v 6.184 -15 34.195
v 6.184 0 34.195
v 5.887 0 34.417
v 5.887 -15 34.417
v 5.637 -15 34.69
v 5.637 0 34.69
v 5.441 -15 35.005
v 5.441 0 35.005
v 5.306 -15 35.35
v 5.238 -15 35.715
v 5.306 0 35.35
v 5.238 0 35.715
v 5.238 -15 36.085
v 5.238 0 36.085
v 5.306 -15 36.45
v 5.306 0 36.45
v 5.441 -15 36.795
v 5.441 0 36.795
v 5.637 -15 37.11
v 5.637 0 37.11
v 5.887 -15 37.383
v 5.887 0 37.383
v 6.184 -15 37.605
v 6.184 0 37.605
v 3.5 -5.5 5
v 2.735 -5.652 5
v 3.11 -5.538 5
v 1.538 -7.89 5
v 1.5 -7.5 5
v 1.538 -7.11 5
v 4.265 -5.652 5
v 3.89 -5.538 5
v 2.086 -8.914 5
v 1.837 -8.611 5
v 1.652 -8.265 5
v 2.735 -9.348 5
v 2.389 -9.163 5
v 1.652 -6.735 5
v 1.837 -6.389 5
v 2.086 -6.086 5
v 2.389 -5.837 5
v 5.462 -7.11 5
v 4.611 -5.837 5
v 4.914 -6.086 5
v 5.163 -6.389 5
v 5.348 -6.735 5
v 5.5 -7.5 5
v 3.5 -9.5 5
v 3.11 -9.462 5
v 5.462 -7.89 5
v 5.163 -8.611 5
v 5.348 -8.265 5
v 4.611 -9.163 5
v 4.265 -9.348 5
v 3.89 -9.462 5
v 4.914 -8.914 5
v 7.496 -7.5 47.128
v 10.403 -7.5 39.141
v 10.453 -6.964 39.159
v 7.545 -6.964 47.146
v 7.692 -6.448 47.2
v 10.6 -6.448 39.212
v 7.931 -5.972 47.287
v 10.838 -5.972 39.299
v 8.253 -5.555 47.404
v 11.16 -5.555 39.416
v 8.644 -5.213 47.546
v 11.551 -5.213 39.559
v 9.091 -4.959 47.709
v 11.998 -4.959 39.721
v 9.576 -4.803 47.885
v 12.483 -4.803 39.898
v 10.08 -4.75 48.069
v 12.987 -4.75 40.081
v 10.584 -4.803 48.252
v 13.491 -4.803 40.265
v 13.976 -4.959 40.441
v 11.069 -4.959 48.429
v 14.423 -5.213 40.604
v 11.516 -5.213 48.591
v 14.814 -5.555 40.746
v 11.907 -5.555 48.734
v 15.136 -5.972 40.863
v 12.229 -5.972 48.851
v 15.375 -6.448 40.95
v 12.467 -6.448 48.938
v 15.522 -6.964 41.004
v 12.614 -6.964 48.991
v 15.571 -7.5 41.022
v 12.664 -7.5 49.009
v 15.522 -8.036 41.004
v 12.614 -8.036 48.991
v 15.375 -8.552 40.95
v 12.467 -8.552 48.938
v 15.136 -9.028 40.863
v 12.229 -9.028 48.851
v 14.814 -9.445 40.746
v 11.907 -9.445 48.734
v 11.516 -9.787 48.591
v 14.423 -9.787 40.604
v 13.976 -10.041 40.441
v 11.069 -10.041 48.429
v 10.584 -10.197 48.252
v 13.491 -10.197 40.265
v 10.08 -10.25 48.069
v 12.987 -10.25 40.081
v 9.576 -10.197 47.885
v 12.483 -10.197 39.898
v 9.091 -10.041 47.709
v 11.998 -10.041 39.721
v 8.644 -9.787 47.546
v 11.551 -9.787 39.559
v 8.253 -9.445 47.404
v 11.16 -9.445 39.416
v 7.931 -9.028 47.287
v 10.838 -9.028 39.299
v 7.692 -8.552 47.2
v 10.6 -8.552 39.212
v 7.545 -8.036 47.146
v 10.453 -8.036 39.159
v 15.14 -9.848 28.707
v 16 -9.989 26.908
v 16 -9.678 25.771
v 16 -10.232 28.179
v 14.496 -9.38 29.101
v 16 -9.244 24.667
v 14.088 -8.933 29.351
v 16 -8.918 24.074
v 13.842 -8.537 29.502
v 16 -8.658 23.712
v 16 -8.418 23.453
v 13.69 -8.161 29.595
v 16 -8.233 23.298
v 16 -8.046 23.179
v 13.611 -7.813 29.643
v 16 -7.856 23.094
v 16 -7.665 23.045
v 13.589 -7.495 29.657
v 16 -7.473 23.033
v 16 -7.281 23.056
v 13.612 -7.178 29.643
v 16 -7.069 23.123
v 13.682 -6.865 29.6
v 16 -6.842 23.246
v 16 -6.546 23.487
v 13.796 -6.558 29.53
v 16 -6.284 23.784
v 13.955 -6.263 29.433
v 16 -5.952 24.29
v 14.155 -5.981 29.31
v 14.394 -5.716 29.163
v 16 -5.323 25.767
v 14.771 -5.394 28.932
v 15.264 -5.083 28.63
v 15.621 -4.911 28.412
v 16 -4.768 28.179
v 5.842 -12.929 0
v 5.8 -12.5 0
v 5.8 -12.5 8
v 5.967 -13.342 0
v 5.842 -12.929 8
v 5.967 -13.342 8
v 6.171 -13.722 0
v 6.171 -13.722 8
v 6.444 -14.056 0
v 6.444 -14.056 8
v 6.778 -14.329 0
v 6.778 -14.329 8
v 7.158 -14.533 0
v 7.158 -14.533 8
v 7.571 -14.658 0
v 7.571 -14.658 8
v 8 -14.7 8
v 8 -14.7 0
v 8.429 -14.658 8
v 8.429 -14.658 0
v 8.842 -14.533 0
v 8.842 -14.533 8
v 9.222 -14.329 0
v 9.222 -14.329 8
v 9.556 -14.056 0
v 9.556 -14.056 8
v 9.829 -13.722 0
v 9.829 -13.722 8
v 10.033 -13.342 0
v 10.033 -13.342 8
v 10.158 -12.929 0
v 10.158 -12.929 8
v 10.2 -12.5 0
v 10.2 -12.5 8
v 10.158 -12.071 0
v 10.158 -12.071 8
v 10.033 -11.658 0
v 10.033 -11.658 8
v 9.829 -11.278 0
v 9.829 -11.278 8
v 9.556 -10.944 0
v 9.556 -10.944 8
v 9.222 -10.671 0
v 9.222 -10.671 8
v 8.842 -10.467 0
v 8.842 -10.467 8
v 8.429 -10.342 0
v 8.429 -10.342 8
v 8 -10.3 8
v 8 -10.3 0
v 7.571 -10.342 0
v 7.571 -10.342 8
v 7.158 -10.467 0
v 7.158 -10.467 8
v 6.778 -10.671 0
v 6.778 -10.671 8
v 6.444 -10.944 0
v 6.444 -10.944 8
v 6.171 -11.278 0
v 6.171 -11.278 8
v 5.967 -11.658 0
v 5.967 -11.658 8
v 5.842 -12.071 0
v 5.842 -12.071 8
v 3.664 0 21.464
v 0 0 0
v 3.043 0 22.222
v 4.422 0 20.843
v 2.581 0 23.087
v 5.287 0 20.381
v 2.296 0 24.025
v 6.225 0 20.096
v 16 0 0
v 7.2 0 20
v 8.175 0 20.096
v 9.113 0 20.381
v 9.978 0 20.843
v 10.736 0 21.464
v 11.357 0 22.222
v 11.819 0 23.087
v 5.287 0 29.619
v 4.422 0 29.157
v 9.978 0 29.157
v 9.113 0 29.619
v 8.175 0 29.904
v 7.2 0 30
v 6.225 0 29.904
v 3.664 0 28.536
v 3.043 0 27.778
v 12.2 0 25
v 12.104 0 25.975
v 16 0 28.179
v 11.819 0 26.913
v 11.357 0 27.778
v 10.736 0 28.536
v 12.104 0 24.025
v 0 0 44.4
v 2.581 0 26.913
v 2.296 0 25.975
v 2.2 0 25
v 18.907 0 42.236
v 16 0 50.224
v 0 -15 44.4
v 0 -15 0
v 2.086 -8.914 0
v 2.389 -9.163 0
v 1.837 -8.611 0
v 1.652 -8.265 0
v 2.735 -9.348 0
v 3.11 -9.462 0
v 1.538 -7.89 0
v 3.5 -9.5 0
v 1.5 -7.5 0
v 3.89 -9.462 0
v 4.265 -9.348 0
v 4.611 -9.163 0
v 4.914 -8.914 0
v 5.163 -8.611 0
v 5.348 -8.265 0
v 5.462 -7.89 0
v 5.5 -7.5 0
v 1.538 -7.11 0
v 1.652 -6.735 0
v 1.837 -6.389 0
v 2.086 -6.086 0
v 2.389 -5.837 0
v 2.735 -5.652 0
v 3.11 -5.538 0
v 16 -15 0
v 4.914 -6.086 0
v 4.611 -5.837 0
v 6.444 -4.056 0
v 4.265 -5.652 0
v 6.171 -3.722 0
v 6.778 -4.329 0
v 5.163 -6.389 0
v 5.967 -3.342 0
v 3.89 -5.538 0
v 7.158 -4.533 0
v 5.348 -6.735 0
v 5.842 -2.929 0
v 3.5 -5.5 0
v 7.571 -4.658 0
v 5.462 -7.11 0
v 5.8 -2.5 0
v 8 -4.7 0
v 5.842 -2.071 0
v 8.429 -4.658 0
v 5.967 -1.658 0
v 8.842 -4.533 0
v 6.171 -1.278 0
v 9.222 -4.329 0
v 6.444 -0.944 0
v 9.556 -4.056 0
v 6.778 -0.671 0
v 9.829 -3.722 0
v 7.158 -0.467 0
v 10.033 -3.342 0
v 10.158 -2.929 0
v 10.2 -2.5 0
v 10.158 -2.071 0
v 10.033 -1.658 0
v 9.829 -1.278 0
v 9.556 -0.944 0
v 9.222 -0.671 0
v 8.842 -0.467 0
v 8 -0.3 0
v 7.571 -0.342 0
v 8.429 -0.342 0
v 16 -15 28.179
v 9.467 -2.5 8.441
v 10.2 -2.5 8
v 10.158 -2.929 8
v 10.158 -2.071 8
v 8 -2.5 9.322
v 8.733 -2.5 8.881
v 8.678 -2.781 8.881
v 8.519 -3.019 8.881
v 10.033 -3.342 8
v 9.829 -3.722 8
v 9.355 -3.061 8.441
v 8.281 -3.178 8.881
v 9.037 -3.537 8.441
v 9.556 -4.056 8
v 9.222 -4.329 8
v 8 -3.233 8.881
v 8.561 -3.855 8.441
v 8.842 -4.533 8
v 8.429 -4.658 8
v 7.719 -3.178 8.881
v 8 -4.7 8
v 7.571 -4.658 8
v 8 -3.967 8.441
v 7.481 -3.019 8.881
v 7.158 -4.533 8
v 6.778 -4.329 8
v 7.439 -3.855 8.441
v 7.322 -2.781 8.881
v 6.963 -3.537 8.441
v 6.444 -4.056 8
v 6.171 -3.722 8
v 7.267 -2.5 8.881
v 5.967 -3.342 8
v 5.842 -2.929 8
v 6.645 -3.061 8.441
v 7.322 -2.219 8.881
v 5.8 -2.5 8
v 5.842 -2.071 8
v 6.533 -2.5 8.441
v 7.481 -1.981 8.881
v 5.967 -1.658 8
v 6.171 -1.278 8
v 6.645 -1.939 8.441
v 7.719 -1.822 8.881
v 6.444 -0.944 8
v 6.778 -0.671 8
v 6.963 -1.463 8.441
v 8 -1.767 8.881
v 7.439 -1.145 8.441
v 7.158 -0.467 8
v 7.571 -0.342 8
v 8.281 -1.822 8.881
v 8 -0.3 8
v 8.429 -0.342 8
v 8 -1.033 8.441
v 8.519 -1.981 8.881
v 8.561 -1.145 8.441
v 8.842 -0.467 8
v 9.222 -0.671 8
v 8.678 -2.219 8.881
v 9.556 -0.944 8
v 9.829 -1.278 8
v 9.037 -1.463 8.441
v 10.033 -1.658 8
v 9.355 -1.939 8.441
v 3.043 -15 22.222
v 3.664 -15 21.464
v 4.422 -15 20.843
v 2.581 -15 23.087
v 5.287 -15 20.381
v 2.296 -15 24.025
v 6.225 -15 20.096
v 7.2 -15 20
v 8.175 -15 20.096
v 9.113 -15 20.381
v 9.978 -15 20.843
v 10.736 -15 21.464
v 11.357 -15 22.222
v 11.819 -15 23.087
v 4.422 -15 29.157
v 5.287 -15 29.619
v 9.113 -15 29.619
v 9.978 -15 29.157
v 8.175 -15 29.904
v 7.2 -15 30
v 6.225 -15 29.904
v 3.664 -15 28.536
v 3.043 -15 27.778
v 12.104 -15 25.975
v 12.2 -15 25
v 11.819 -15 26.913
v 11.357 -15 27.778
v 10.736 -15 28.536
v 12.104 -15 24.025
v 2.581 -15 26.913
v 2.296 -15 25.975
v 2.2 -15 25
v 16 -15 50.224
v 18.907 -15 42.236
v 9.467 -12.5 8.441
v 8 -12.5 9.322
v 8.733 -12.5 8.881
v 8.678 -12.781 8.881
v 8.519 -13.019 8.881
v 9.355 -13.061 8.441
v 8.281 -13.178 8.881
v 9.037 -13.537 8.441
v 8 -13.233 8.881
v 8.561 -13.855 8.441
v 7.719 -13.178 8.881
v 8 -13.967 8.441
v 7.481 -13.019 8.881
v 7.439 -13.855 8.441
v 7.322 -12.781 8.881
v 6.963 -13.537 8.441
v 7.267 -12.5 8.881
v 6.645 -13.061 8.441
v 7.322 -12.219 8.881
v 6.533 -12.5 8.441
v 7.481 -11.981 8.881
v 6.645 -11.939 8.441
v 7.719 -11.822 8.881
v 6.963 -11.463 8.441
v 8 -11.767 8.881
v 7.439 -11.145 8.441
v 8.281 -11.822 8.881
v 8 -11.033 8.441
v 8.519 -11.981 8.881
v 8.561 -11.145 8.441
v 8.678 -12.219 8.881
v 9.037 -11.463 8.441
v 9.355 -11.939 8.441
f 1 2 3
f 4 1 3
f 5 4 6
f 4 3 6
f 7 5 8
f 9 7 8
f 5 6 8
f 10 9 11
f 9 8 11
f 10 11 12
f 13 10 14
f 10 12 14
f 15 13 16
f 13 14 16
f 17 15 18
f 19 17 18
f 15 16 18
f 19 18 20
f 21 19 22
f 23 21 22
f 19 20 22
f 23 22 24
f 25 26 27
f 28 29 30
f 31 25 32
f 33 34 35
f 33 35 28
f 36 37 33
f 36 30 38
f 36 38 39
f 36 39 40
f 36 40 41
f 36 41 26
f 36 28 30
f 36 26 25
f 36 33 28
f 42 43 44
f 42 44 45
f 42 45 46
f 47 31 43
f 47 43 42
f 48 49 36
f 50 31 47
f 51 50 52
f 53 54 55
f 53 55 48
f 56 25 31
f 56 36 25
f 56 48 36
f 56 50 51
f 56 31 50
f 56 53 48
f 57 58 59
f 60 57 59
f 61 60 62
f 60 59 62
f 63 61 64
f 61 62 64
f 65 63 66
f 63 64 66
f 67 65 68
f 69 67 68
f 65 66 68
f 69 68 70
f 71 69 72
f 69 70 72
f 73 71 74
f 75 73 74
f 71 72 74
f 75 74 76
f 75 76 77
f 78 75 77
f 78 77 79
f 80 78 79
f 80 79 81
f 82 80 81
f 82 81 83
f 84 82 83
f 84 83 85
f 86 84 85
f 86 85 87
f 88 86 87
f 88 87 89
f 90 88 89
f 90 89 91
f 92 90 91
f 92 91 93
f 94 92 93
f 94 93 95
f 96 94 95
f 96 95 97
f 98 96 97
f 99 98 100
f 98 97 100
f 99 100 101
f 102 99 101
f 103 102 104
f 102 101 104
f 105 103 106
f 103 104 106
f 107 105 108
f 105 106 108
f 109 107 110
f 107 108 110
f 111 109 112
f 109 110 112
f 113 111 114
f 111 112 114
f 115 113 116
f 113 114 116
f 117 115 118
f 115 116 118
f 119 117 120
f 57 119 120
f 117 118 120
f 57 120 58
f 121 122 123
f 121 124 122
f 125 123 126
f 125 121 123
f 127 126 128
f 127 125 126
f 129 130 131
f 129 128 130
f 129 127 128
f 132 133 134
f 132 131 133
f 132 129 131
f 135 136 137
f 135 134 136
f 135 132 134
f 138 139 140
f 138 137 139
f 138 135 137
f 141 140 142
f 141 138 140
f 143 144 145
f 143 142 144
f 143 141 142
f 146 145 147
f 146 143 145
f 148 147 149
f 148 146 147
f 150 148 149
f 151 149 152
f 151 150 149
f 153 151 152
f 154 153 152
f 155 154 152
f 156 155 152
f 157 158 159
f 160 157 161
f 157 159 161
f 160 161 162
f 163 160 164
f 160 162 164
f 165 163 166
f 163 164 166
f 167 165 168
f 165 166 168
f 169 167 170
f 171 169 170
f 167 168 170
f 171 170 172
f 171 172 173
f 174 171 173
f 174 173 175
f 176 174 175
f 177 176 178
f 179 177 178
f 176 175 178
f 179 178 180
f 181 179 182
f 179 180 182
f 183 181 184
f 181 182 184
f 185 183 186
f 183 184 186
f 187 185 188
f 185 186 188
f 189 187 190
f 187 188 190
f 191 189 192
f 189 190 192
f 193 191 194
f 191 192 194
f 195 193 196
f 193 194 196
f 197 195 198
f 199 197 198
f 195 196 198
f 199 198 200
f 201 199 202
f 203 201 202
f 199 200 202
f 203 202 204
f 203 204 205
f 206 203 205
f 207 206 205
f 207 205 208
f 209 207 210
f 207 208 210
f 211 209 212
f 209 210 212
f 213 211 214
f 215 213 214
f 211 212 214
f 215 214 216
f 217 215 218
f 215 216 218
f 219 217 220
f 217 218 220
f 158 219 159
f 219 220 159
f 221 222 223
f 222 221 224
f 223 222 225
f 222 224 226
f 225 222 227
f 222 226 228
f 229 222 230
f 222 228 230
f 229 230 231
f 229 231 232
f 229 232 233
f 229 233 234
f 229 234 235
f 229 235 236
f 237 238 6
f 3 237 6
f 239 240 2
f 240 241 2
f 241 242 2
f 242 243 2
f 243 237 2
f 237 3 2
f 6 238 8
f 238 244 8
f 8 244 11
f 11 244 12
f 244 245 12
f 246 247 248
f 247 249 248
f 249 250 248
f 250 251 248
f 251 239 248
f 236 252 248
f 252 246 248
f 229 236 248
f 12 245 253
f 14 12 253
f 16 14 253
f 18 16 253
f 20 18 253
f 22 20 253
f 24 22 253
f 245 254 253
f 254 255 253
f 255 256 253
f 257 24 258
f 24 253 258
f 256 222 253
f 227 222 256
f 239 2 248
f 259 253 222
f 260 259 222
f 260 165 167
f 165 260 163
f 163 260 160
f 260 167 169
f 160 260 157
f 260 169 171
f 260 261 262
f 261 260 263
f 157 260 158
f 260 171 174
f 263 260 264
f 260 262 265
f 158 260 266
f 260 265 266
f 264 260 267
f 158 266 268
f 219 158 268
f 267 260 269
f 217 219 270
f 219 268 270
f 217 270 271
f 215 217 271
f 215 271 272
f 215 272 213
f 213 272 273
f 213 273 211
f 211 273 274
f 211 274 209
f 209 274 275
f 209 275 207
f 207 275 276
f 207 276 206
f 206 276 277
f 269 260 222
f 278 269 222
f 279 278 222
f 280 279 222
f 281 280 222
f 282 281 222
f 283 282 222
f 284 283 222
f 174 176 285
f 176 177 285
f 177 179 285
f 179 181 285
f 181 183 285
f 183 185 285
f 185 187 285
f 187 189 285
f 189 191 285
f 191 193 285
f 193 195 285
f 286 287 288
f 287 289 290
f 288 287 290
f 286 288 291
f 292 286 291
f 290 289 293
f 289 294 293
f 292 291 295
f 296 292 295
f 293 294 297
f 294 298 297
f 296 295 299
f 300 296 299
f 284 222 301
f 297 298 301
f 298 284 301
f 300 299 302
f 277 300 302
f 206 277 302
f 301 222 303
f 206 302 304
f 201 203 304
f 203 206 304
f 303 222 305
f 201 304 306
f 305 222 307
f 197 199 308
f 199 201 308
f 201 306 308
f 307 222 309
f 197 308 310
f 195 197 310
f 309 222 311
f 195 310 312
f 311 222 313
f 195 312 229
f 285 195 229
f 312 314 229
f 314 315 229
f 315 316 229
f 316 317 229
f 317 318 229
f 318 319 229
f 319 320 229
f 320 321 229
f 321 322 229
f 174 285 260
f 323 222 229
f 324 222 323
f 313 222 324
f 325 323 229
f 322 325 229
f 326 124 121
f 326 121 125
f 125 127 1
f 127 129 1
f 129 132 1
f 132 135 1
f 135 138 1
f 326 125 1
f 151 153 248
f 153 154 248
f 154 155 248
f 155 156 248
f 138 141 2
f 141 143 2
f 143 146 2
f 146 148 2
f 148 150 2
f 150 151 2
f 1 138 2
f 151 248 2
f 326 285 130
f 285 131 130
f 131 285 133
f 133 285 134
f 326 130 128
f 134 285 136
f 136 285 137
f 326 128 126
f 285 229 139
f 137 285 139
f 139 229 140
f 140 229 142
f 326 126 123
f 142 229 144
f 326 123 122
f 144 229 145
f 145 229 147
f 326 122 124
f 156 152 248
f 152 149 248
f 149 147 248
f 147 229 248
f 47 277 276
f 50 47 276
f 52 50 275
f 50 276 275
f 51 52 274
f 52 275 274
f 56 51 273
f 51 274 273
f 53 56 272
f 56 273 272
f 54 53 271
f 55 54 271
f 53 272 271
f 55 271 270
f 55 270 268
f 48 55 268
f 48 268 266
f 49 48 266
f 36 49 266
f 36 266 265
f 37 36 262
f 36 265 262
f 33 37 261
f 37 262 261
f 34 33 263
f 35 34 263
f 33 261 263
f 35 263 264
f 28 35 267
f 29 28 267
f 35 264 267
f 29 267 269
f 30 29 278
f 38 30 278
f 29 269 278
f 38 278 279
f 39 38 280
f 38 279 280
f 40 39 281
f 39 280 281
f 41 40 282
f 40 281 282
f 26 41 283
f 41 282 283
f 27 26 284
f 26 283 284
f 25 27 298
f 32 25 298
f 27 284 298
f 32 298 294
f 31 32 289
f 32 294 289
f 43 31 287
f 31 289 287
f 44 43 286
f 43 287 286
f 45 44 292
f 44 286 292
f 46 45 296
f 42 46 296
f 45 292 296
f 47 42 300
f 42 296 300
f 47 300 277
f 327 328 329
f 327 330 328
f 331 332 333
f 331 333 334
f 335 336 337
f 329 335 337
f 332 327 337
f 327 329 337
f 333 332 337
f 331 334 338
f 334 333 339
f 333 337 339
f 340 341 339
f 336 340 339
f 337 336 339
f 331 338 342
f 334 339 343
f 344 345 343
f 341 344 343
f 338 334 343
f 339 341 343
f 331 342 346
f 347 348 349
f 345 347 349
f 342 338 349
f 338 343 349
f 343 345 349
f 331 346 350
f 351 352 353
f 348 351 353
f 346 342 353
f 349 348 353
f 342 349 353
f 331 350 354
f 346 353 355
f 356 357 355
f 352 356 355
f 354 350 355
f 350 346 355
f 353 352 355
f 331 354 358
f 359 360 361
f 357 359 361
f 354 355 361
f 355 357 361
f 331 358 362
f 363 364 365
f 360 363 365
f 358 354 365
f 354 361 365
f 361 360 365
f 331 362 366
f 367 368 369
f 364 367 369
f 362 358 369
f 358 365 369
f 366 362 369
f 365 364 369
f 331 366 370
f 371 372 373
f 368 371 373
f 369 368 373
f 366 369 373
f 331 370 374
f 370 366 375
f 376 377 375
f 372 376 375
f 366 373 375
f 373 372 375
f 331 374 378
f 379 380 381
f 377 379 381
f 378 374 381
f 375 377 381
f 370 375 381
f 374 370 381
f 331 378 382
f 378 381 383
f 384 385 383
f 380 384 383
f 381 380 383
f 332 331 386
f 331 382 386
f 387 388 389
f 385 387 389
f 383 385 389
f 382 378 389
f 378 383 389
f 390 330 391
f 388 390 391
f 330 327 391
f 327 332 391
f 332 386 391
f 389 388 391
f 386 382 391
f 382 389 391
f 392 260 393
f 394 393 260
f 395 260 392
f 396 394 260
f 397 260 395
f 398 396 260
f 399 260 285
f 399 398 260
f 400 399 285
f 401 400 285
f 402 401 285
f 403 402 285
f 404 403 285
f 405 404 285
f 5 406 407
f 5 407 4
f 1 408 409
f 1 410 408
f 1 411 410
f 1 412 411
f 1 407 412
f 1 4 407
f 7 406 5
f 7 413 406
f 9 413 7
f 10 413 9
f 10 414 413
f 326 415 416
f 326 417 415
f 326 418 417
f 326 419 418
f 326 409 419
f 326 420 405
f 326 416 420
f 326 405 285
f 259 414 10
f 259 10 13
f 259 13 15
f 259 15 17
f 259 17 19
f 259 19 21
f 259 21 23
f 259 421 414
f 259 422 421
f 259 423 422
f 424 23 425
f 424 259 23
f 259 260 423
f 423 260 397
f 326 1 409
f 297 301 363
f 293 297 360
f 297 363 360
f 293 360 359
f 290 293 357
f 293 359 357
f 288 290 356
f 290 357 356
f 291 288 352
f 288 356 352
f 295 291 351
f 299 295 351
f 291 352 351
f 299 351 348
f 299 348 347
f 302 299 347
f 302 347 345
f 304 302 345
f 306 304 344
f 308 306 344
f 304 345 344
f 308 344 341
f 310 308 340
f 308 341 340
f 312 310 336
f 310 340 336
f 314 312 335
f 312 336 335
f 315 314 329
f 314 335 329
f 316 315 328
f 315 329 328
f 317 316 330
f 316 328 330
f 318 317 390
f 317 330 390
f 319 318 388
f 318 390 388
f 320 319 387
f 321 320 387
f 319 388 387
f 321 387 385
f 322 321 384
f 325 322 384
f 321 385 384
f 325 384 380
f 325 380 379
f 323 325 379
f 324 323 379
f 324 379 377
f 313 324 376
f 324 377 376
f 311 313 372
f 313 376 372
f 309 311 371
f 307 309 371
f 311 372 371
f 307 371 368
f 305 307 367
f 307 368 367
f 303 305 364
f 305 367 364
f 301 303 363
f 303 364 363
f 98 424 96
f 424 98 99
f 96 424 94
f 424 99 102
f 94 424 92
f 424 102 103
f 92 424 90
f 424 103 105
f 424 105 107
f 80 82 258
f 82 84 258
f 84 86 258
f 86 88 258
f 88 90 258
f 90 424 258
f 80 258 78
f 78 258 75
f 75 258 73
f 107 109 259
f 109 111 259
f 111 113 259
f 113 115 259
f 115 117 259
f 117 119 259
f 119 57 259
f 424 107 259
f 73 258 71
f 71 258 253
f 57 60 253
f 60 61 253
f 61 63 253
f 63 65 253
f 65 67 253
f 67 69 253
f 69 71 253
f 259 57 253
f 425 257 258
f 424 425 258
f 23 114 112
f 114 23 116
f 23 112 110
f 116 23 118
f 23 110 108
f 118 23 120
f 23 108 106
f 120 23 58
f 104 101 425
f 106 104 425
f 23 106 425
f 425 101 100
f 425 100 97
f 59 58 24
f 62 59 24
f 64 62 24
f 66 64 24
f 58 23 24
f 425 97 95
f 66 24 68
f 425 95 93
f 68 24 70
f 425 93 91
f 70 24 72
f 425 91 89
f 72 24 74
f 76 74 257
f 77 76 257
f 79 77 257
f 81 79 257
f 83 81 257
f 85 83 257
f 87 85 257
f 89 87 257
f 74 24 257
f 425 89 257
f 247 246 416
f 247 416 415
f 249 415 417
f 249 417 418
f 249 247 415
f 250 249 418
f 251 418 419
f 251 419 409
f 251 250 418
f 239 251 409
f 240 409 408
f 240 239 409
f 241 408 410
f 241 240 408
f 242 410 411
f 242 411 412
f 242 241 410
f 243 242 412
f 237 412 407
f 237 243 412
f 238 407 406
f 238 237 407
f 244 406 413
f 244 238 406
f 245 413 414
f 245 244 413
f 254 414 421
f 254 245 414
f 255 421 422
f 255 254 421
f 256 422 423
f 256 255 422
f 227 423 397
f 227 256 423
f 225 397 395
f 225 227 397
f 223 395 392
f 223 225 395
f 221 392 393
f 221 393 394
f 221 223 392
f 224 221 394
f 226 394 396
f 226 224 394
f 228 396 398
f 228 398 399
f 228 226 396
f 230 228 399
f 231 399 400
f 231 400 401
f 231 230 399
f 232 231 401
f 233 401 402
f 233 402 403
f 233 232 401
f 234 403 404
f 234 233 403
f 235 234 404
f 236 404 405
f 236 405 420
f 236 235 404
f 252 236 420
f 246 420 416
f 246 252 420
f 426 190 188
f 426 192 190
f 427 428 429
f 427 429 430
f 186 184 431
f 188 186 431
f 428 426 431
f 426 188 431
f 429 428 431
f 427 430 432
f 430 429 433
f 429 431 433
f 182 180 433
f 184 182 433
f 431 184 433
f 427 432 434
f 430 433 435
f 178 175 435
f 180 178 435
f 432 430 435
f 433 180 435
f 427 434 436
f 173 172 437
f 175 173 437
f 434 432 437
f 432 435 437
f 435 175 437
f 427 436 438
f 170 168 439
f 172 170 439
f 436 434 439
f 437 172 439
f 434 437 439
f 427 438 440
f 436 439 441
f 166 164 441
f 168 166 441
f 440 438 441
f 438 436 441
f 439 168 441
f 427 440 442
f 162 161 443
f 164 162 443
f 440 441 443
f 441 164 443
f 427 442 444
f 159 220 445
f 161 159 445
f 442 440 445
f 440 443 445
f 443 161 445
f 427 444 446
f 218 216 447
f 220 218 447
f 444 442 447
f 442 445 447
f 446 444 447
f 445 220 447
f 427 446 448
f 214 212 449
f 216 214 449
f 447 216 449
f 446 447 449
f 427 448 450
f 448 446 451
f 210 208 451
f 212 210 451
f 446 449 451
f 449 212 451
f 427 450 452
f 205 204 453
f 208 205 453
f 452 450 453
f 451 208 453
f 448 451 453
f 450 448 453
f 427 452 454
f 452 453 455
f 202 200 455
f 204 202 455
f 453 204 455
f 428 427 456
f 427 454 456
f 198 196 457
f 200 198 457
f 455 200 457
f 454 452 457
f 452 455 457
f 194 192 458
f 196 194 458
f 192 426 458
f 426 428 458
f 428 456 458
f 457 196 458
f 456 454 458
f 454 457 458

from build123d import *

# Parameters (mm, degrees)
F0_R     = 5
F1_DEPTH = 15
F3_D     = 5.5
F4_R     = 2
F5_DEPTH = 5
F6_D     = 4.4
F6_DEPTH = 8
F6_TIP   = 1.3218933619
F7_R     = 3
F8_DEPTH = 25


with BuildPart() as f1:
    # F0 (on Front) → F1 (new body)
    with BuildSketch(Plane.XZ):
        with BuildLine():
            Line((0, 44.4), (0, 0))
            Line((0, 0), (16, 0))
            Line((16, 0), (16, 28.1794662359))
            Line((16, 28.1794662359), (6.183998533, 34.1947196713))
            ThreePointArc((6.183998533, 34.1947196713), (5.2289956624, 35.9), (6.183998533, 37.6052803287))
            Line((6.183998533, 37.6052803287), (18.9071712183, 42.2361364716))
            Line((18.9071712183, 42.2361364716), (16, 50.2235237483))
            Line((16, 50.2235237483), (0, 44.4))
        make_face()
        with Locations((7.2, 25)):
            Circle(F0_R, mode=Mode.SUBTRACT)
    extrude(amount=F1_DEPTH)

    # F3 (through all)
    with Locations(Plane(origin=(-14.269884935, 0, 39.2061866372), x_dir=(0.9396926208, 0, 0.3420201433), z_dir=(-0.3420201433, 0, 0.9396926208))):
        with Locations((25.9125387233, -7.5)):
            Hole(F3_D / 2)

    # F4 (on face) → F5 (cut)
    with BuildSketch(Plane(origin=(0, 0, 0), x_dir=(1, 0, 0), z_dir=(0, 0, -1))):
        with Locations((3.5, 7.5)):
            Circle(F4_R)
    extrude(amount=-F5_DEPTH, mode=Mode.SUBTRACT)

    # F6
    with Locations(Plane(origin=(0, 0, 0), x_dir=(1, 0, 0), z_dir=(0, 0, -1))):
        with Locations((8, 12.5), (8, 2.5)):
            Hole(F6_D / 2, depth=F6_DEPTH)
            with Locations((0, 0, -(F6_DEPTH + F6_TIP / 2))):  # 118° drill point
                Cone(0, F6_D / 2, F6_TIP, mode=Mode.SUBTRACT)

    # F7 (on face) → F8 (cut)
    with BuildSketch(Plane(origin=(-11.3627137168, 0, 31.2187993606), x_dir=(0.9396926208, 0, 0.3420201433), z_dir=(0.3420201433, 0, -0.9396926208))):
        with Locations((25.9125387233, 7.5)):
            Circle(F7_R)
    extrude(amount=F8_DEPTH, mode=Mode.SUBTRACT)


solid = f1.part
